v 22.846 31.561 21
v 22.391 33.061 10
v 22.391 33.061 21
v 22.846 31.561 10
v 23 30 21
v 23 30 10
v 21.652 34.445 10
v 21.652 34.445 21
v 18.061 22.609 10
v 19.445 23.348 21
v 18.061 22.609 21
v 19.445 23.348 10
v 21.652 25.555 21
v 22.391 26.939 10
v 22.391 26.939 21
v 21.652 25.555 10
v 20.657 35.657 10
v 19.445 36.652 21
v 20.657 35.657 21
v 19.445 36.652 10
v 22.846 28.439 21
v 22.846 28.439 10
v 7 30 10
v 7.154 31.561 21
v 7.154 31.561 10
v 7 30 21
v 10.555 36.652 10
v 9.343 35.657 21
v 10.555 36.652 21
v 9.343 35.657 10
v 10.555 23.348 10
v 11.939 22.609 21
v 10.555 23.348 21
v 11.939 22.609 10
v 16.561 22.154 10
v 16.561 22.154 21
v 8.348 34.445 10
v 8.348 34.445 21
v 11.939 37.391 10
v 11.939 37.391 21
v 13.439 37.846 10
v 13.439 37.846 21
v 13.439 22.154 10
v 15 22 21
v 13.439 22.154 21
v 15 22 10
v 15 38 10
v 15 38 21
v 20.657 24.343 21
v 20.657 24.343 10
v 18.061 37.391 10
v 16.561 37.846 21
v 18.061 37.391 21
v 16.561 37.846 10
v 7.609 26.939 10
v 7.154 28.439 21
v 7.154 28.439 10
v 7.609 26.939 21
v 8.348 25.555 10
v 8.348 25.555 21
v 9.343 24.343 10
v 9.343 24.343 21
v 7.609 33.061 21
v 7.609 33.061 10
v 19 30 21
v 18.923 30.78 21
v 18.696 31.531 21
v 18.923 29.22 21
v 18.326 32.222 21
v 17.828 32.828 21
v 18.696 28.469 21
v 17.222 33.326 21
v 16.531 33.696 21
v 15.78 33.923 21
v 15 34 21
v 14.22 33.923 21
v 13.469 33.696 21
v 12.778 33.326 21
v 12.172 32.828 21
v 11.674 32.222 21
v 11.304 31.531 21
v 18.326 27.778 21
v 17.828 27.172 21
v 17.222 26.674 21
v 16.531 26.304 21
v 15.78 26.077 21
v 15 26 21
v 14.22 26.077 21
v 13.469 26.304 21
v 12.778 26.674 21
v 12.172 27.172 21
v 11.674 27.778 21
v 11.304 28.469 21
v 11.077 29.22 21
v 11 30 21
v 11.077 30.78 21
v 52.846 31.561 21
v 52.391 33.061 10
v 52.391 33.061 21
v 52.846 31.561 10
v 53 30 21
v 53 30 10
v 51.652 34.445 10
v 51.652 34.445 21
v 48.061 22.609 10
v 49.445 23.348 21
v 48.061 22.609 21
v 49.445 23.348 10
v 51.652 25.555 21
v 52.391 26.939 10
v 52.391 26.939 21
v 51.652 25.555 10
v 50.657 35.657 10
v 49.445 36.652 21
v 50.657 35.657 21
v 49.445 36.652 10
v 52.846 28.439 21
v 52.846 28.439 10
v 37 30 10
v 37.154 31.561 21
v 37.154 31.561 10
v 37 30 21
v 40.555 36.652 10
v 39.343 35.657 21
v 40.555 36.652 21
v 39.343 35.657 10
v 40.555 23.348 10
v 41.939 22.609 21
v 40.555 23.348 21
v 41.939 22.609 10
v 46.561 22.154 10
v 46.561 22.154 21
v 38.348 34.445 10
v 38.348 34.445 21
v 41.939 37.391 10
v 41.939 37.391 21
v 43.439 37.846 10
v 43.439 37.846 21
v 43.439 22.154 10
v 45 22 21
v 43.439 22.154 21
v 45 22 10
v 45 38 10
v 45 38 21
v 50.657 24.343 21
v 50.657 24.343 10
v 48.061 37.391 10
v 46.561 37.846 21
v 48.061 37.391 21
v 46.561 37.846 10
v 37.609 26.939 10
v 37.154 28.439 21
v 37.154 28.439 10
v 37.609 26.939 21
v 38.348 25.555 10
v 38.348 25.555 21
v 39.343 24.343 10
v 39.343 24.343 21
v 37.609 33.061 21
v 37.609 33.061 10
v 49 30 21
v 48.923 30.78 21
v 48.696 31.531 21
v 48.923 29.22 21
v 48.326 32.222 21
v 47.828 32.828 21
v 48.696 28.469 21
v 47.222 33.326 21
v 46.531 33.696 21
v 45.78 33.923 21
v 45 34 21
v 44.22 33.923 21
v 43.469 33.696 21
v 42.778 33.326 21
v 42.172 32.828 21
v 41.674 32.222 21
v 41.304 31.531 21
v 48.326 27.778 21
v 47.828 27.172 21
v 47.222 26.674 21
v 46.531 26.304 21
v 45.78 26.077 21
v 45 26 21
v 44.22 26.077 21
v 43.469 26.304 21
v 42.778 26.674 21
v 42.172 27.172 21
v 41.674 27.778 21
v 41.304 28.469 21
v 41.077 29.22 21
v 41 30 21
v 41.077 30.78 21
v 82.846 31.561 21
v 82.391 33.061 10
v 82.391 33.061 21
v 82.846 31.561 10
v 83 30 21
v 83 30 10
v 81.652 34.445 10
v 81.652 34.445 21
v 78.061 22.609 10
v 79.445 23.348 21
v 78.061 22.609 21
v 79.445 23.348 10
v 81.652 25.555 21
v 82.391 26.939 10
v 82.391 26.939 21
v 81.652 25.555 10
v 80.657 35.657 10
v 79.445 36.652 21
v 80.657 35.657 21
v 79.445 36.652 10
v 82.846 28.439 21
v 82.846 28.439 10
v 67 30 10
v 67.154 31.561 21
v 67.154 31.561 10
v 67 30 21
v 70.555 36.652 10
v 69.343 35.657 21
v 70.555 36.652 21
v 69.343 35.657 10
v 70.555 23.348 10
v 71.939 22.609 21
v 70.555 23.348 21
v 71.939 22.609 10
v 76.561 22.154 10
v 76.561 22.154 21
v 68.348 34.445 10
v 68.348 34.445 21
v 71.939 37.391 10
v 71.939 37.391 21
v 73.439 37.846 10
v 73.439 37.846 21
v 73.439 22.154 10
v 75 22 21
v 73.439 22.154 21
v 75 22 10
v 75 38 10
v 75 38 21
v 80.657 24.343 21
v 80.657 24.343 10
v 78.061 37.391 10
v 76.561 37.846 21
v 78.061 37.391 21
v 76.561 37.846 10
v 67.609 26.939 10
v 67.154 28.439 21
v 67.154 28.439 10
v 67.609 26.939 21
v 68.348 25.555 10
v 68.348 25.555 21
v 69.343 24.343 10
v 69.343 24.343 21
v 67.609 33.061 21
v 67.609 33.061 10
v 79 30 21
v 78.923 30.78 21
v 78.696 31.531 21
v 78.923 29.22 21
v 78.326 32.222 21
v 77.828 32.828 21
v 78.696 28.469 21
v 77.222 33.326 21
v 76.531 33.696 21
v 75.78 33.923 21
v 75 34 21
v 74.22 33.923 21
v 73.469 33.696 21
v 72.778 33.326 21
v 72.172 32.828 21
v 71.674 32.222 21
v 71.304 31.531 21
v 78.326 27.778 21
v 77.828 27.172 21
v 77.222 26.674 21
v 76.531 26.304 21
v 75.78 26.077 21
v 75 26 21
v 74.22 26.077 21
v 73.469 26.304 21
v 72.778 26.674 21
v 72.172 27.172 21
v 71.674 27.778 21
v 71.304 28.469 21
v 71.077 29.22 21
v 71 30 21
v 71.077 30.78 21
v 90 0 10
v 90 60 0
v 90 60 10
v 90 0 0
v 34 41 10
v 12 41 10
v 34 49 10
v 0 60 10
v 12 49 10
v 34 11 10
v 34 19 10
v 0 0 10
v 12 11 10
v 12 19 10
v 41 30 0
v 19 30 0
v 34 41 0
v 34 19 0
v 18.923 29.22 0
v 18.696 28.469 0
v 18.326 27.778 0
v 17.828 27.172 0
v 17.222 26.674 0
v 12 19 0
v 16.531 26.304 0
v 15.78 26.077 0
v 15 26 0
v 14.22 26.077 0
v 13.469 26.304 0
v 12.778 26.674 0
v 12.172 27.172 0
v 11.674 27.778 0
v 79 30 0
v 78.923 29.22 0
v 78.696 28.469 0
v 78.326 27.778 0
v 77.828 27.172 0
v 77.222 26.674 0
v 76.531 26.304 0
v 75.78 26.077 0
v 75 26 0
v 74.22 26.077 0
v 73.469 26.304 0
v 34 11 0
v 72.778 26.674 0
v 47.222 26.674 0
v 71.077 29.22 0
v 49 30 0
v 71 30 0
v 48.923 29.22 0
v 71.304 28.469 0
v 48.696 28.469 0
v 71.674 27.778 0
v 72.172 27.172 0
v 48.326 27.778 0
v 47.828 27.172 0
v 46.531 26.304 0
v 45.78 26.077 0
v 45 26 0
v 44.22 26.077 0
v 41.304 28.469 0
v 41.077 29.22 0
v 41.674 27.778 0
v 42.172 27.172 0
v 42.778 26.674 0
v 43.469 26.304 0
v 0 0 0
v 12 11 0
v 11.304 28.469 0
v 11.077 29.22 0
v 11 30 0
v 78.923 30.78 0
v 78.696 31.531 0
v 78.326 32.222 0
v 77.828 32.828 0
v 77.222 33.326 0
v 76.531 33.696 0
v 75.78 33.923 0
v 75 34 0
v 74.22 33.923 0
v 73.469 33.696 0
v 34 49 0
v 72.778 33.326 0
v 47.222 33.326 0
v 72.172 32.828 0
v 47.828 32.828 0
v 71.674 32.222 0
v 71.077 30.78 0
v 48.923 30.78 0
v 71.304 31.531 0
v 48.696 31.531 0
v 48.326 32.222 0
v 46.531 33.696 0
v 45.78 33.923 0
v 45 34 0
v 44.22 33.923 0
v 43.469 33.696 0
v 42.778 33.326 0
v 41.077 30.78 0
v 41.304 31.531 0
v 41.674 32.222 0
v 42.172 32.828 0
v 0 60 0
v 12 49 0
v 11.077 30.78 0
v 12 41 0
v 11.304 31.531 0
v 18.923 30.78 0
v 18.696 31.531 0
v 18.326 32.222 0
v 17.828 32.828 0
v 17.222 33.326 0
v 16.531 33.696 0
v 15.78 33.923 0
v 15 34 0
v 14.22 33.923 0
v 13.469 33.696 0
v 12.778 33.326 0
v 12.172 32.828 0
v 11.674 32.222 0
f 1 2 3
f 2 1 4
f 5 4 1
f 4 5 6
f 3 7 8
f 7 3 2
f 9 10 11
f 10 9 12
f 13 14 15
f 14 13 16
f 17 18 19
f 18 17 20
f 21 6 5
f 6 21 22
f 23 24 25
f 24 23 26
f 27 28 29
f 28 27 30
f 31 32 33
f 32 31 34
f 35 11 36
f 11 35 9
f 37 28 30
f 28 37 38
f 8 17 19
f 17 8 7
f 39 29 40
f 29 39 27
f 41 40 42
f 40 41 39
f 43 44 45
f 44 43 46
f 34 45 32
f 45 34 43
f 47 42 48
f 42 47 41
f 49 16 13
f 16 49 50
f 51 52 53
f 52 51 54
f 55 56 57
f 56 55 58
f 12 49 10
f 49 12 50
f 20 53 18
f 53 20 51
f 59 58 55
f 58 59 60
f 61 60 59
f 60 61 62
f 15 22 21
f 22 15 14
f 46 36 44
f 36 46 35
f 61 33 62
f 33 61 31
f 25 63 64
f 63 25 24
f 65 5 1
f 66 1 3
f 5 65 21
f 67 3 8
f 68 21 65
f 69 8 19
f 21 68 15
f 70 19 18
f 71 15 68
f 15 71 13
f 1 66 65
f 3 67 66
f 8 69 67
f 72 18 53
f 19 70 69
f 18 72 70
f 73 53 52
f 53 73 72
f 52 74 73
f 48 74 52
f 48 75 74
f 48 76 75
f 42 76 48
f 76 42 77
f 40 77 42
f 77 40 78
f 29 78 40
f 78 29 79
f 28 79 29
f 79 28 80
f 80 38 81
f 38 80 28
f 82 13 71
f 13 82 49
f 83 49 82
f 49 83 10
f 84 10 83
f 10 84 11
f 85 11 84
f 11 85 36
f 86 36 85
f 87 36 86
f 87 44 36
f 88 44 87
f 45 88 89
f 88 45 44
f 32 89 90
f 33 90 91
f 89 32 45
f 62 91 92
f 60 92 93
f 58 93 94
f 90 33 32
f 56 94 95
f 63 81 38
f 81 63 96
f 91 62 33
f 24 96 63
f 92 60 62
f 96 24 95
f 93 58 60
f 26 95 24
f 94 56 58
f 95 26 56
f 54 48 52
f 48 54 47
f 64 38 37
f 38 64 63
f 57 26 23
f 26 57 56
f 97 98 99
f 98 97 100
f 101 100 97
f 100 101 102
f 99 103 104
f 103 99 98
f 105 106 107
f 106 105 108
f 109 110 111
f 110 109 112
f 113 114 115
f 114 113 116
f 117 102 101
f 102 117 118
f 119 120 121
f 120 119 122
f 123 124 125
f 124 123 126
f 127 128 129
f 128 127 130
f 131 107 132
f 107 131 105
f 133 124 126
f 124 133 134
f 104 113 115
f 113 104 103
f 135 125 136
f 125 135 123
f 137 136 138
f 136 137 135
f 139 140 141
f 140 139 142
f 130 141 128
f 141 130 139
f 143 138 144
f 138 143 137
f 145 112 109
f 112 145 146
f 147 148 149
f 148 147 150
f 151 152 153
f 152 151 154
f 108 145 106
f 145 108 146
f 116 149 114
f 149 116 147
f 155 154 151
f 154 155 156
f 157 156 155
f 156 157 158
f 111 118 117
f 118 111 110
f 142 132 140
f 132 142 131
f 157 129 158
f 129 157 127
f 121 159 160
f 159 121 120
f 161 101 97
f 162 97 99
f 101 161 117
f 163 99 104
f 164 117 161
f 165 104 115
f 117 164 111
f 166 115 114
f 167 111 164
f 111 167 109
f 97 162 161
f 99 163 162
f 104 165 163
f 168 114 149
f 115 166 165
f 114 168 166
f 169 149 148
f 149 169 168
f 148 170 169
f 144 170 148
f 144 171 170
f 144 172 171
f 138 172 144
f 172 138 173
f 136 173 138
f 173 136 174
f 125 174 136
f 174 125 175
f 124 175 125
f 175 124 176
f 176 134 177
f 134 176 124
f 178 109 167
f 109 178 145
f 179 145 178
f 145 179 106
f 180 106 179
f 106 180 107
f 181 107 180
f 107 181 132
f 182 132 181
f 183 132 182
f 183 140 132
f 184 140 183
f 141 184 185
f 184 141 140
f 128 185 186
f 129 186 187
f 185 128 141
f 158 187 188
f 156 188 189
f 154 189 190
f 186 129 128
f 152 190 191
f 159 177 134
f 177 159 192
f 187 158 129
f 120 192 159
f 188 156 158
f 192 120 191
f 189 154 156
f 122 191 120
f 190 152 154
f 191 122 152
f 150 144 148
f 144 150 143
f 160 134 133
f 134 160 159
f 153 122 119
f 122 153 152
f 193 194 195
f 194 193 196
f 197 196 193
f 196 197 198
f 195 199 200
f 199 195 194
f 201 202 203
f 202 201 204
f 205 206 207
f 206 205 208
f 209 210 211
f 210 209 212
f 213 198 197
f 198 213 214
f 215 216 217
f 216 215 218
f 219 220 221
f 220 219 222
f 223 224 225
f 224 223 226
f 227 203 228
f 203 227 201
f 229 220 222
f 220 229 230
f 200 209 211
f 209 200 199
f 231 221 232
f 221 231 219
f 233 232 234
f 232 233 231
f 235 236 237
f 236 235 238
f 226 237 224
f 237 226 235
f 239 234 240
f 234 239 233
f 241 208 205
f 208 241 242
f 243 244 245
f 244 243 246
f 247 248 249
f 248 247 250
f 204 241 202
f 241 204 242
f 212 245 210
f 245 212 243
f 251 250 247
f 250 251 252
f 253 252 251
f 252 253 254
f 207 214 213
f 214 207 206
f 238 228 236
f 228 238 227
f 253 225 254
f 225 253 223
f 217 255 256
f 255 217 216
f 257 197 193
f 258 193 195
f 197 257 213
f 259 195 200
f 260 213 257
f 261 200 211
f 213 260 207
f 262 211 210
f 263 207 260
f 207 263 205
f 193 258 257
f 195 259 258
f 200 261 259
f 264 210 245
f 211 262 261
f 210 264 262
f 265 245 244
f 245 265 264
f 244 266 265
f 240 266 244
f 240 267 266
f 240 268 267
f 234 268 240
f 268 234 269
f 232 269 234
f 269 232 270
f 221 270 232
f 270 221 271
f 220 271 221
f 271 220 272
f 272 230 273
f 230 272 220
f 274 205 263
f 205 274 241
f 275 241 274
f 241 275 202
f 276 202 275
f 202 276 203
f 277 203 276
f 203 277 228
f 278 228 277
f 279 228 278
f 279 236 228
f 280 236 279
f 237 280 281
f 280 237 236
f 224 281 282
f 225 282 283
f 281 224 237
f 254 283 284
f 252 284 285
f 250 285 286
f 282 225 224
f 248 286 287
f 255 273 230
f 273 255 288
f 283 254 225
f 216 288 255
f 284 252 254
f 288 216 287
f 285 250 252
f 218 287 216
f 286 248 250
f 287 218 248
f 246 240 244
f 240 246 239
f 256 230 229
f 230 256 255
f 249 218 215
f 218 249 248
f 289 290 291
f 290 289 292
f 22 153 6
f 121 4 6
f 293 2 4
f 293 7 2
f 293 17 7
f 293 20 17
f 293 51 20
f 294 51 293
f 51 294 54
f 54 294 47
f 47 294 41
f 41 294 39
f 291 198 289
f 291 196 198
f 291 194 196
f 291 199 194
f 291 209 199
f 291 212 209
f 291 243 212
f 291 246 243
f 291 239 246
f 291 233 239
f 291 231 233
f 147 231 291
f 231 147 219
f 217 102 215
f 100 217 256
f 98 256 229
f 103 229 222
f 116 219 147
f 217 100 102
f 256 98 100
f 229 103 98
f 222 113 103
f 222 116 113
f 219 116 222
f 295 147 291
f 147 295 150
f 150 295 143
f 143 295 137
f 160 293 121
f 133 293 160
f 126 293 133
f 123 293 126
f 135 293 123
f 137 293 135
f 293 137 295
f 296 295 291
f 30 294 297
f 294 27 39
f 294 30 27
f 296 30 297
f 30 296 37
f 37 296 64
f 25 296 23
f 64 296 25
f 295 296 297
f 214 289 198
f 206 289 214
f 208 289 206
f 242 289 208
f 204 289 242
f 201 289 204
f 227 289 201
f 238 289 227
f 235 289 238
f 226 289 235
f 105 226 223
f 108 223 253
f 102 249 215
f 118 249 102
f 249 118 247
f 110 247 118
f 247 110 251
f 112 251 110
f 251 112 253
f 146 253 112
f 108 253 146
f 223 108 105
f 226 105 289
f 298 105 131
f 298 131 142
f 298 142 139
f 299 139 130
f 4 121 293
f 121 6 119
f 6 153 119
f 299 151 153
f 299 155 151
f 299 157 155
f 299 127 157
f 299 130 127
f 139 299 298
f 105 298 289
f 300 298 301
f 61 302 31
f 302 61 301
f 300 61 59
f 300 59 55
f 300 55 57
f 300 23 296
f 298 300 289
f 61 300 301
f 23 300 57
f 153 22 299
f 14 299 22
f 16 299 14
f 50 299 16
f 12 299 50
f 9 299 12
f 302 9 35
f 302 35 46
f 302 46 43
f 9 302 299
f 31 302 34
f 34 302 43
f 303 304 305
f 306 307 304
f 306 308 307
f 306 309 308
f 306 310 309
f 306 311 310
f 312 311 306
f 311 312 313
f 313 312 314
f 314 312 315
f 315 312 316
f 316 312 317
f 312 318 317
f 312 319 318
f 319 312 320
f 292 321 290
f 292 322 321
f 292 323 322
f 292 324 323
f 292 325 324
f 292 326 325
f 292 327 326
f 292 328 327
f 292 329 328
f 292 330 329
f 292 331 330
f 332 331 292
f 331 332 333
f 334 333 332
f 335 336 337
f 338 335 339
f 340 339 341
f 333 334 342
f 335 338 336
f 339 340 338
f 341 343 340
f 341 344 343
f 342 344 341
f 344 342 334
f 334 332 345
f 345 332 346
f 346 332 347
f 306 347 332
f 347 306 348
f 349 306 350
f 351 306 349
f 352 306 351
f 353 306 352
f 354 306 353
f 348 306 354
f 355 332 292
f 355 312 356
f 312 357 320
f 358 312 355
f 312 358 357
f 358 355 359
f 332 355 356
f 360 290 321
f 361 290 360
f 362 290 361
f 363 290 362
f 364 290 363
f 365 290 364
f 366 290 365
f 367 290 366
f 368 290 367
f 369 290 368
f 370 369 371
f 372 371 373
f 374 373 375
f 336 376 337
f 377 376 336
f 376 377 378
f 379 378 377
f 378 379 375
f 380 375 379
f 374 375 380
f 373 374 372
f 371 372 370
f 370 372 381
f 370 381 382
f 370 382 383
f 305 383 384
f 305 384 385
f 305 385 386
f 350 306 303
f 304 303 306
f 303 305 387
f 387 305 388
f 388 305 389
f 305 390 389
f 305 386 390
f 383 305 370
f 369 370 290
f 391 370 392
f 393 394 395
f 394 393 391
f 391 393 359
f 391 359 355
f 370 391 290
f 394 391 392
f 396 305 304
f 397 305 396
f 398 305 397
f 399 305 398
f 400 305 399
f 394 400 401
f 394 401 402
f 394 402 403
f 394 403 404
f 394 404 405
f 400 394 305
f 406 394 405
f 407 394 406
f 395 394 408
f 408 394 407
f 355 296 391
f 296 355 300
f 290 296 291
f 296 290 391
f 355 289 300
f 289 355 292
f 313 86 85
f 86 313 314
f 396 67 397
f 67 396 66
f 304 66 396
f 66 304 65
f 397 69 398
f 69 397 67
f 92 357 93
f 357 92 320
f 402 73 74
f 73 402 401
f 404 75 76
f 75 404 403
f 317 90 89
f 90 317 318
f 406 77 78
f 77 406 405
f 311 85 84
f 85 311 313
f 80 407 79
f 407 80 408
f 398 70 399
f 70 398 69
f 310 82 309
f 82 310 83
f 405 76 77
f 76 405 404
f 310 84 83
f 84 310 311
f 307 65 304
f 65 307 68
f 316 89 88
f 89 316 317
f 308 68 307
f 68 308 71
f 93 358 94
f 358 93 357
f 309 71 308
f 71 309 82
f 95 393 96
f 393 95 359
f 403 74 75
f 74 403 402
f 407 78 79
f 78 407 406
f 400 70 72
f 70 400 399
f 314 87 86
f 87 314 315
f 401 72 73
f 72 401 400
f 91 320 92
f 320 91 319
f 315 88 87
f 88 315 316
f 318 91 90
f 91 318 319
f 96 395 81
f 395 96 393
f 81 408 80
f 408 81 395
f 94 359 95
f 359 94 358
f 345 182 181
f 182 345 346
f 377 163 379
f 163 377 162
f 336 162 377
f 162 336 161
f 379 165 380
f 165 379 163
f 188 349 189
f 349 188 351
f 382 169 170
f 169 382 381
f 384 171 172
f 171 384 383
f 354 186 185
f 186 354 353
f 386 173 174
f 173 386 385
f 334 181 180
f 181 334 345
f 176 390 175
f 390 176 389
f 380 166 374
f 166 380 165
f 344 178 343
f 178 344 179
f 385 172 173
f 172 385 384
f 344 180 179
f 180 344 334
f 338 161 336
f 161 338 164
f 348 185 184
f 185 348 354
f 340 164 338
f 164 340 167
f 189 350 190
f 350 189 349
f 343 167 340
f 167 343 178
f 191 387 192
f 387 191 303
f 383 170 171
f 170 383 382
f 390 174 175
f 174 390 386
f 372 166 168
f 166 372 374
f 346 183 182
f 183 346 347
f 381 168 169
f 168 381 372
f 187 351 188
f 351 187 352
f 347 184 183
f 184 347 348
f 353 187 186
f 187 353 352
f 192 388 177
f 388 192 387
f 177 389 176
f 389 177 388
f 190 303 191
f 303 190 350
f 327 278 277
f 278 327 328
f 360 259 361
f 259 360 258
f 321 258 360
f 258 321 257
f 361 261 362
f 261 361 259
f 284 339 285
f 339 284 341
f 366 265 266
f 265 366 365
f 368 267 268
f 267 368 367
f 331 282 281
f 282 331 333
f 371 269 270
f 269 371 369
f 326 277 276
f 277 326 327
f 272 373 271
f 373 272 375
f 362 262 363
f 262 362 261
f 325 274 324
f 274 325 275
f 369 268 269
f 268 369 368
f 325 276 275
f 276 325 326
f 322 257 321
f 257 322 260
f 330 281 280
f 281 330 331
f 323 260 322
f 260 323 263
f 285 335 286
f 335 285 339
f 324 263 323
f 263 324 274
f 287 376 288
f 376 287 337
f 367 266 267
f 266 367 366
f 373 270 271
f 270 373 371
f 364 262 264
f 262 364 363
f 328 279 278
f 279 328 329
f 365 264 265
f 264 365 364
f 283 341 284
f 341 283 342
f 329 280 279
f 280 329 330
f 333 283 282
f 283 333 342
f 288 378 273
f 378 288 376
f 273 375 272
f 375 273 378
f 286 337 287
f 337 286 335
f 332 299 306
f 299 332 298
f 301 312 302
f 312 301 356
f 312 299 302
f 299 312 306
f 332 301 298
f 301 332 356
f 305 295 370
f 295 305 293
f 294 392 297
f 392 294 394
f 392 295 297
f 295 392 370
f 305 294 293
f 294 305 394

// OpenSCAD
$fn = 32;

// ----------------------------------------------------------------------
// Drill jig: three_boss_slot jig
// ----------------------------------------------------------------------

// --- parameters (mm) ---
plate_l = 90;             // plate length, X
plate_w = 60;             // plate width, Y
plate_t = 10;             // plate thickness
boss_d = 16;              // guide boss diameter
boss_h = 12;              // boss height above the plate
guide_d = 8;              // guide hole diameter
boss_pitch = 30;          // boss pitch
slot_w = 8;               // clamp slot width
slot_l = 22;              // clamp slot length
slot_x = 12;              // slot start X

n_boss = 3;  // guide bosses
boss_x0 = (plate_l - (n_boss - 1) * boss_pitch) / 2;  // first boss X
boss_top = plate_t - 1 + boss_h;  // boss crown height
total_h = boss_top;  // overall height

difference() {
  union() {
  cube([plate_l, plate_w, plate_t]);
  for (i = [0 : n_boss - 1])
    translate([boss_x0 + i * boss_pitch, plate_w / 2, plate_t - 1])
      cylinder(h = boss_h, d = boss_d);
  }
  for (i = [0 : n_boss - 1])
    translate([boss_x0 + i * boss_pitch, plate_w / 2, -1])
      cylinder(h = plate_t + boss_h, d = guide_d);
  for (cy = [plate_w * 0.25, plate_w * 0.75])
    translate([slot_x, cy - slot_w / 2, -1])
      cube([slot_l, slot_w, plate_t + 2]);
}
